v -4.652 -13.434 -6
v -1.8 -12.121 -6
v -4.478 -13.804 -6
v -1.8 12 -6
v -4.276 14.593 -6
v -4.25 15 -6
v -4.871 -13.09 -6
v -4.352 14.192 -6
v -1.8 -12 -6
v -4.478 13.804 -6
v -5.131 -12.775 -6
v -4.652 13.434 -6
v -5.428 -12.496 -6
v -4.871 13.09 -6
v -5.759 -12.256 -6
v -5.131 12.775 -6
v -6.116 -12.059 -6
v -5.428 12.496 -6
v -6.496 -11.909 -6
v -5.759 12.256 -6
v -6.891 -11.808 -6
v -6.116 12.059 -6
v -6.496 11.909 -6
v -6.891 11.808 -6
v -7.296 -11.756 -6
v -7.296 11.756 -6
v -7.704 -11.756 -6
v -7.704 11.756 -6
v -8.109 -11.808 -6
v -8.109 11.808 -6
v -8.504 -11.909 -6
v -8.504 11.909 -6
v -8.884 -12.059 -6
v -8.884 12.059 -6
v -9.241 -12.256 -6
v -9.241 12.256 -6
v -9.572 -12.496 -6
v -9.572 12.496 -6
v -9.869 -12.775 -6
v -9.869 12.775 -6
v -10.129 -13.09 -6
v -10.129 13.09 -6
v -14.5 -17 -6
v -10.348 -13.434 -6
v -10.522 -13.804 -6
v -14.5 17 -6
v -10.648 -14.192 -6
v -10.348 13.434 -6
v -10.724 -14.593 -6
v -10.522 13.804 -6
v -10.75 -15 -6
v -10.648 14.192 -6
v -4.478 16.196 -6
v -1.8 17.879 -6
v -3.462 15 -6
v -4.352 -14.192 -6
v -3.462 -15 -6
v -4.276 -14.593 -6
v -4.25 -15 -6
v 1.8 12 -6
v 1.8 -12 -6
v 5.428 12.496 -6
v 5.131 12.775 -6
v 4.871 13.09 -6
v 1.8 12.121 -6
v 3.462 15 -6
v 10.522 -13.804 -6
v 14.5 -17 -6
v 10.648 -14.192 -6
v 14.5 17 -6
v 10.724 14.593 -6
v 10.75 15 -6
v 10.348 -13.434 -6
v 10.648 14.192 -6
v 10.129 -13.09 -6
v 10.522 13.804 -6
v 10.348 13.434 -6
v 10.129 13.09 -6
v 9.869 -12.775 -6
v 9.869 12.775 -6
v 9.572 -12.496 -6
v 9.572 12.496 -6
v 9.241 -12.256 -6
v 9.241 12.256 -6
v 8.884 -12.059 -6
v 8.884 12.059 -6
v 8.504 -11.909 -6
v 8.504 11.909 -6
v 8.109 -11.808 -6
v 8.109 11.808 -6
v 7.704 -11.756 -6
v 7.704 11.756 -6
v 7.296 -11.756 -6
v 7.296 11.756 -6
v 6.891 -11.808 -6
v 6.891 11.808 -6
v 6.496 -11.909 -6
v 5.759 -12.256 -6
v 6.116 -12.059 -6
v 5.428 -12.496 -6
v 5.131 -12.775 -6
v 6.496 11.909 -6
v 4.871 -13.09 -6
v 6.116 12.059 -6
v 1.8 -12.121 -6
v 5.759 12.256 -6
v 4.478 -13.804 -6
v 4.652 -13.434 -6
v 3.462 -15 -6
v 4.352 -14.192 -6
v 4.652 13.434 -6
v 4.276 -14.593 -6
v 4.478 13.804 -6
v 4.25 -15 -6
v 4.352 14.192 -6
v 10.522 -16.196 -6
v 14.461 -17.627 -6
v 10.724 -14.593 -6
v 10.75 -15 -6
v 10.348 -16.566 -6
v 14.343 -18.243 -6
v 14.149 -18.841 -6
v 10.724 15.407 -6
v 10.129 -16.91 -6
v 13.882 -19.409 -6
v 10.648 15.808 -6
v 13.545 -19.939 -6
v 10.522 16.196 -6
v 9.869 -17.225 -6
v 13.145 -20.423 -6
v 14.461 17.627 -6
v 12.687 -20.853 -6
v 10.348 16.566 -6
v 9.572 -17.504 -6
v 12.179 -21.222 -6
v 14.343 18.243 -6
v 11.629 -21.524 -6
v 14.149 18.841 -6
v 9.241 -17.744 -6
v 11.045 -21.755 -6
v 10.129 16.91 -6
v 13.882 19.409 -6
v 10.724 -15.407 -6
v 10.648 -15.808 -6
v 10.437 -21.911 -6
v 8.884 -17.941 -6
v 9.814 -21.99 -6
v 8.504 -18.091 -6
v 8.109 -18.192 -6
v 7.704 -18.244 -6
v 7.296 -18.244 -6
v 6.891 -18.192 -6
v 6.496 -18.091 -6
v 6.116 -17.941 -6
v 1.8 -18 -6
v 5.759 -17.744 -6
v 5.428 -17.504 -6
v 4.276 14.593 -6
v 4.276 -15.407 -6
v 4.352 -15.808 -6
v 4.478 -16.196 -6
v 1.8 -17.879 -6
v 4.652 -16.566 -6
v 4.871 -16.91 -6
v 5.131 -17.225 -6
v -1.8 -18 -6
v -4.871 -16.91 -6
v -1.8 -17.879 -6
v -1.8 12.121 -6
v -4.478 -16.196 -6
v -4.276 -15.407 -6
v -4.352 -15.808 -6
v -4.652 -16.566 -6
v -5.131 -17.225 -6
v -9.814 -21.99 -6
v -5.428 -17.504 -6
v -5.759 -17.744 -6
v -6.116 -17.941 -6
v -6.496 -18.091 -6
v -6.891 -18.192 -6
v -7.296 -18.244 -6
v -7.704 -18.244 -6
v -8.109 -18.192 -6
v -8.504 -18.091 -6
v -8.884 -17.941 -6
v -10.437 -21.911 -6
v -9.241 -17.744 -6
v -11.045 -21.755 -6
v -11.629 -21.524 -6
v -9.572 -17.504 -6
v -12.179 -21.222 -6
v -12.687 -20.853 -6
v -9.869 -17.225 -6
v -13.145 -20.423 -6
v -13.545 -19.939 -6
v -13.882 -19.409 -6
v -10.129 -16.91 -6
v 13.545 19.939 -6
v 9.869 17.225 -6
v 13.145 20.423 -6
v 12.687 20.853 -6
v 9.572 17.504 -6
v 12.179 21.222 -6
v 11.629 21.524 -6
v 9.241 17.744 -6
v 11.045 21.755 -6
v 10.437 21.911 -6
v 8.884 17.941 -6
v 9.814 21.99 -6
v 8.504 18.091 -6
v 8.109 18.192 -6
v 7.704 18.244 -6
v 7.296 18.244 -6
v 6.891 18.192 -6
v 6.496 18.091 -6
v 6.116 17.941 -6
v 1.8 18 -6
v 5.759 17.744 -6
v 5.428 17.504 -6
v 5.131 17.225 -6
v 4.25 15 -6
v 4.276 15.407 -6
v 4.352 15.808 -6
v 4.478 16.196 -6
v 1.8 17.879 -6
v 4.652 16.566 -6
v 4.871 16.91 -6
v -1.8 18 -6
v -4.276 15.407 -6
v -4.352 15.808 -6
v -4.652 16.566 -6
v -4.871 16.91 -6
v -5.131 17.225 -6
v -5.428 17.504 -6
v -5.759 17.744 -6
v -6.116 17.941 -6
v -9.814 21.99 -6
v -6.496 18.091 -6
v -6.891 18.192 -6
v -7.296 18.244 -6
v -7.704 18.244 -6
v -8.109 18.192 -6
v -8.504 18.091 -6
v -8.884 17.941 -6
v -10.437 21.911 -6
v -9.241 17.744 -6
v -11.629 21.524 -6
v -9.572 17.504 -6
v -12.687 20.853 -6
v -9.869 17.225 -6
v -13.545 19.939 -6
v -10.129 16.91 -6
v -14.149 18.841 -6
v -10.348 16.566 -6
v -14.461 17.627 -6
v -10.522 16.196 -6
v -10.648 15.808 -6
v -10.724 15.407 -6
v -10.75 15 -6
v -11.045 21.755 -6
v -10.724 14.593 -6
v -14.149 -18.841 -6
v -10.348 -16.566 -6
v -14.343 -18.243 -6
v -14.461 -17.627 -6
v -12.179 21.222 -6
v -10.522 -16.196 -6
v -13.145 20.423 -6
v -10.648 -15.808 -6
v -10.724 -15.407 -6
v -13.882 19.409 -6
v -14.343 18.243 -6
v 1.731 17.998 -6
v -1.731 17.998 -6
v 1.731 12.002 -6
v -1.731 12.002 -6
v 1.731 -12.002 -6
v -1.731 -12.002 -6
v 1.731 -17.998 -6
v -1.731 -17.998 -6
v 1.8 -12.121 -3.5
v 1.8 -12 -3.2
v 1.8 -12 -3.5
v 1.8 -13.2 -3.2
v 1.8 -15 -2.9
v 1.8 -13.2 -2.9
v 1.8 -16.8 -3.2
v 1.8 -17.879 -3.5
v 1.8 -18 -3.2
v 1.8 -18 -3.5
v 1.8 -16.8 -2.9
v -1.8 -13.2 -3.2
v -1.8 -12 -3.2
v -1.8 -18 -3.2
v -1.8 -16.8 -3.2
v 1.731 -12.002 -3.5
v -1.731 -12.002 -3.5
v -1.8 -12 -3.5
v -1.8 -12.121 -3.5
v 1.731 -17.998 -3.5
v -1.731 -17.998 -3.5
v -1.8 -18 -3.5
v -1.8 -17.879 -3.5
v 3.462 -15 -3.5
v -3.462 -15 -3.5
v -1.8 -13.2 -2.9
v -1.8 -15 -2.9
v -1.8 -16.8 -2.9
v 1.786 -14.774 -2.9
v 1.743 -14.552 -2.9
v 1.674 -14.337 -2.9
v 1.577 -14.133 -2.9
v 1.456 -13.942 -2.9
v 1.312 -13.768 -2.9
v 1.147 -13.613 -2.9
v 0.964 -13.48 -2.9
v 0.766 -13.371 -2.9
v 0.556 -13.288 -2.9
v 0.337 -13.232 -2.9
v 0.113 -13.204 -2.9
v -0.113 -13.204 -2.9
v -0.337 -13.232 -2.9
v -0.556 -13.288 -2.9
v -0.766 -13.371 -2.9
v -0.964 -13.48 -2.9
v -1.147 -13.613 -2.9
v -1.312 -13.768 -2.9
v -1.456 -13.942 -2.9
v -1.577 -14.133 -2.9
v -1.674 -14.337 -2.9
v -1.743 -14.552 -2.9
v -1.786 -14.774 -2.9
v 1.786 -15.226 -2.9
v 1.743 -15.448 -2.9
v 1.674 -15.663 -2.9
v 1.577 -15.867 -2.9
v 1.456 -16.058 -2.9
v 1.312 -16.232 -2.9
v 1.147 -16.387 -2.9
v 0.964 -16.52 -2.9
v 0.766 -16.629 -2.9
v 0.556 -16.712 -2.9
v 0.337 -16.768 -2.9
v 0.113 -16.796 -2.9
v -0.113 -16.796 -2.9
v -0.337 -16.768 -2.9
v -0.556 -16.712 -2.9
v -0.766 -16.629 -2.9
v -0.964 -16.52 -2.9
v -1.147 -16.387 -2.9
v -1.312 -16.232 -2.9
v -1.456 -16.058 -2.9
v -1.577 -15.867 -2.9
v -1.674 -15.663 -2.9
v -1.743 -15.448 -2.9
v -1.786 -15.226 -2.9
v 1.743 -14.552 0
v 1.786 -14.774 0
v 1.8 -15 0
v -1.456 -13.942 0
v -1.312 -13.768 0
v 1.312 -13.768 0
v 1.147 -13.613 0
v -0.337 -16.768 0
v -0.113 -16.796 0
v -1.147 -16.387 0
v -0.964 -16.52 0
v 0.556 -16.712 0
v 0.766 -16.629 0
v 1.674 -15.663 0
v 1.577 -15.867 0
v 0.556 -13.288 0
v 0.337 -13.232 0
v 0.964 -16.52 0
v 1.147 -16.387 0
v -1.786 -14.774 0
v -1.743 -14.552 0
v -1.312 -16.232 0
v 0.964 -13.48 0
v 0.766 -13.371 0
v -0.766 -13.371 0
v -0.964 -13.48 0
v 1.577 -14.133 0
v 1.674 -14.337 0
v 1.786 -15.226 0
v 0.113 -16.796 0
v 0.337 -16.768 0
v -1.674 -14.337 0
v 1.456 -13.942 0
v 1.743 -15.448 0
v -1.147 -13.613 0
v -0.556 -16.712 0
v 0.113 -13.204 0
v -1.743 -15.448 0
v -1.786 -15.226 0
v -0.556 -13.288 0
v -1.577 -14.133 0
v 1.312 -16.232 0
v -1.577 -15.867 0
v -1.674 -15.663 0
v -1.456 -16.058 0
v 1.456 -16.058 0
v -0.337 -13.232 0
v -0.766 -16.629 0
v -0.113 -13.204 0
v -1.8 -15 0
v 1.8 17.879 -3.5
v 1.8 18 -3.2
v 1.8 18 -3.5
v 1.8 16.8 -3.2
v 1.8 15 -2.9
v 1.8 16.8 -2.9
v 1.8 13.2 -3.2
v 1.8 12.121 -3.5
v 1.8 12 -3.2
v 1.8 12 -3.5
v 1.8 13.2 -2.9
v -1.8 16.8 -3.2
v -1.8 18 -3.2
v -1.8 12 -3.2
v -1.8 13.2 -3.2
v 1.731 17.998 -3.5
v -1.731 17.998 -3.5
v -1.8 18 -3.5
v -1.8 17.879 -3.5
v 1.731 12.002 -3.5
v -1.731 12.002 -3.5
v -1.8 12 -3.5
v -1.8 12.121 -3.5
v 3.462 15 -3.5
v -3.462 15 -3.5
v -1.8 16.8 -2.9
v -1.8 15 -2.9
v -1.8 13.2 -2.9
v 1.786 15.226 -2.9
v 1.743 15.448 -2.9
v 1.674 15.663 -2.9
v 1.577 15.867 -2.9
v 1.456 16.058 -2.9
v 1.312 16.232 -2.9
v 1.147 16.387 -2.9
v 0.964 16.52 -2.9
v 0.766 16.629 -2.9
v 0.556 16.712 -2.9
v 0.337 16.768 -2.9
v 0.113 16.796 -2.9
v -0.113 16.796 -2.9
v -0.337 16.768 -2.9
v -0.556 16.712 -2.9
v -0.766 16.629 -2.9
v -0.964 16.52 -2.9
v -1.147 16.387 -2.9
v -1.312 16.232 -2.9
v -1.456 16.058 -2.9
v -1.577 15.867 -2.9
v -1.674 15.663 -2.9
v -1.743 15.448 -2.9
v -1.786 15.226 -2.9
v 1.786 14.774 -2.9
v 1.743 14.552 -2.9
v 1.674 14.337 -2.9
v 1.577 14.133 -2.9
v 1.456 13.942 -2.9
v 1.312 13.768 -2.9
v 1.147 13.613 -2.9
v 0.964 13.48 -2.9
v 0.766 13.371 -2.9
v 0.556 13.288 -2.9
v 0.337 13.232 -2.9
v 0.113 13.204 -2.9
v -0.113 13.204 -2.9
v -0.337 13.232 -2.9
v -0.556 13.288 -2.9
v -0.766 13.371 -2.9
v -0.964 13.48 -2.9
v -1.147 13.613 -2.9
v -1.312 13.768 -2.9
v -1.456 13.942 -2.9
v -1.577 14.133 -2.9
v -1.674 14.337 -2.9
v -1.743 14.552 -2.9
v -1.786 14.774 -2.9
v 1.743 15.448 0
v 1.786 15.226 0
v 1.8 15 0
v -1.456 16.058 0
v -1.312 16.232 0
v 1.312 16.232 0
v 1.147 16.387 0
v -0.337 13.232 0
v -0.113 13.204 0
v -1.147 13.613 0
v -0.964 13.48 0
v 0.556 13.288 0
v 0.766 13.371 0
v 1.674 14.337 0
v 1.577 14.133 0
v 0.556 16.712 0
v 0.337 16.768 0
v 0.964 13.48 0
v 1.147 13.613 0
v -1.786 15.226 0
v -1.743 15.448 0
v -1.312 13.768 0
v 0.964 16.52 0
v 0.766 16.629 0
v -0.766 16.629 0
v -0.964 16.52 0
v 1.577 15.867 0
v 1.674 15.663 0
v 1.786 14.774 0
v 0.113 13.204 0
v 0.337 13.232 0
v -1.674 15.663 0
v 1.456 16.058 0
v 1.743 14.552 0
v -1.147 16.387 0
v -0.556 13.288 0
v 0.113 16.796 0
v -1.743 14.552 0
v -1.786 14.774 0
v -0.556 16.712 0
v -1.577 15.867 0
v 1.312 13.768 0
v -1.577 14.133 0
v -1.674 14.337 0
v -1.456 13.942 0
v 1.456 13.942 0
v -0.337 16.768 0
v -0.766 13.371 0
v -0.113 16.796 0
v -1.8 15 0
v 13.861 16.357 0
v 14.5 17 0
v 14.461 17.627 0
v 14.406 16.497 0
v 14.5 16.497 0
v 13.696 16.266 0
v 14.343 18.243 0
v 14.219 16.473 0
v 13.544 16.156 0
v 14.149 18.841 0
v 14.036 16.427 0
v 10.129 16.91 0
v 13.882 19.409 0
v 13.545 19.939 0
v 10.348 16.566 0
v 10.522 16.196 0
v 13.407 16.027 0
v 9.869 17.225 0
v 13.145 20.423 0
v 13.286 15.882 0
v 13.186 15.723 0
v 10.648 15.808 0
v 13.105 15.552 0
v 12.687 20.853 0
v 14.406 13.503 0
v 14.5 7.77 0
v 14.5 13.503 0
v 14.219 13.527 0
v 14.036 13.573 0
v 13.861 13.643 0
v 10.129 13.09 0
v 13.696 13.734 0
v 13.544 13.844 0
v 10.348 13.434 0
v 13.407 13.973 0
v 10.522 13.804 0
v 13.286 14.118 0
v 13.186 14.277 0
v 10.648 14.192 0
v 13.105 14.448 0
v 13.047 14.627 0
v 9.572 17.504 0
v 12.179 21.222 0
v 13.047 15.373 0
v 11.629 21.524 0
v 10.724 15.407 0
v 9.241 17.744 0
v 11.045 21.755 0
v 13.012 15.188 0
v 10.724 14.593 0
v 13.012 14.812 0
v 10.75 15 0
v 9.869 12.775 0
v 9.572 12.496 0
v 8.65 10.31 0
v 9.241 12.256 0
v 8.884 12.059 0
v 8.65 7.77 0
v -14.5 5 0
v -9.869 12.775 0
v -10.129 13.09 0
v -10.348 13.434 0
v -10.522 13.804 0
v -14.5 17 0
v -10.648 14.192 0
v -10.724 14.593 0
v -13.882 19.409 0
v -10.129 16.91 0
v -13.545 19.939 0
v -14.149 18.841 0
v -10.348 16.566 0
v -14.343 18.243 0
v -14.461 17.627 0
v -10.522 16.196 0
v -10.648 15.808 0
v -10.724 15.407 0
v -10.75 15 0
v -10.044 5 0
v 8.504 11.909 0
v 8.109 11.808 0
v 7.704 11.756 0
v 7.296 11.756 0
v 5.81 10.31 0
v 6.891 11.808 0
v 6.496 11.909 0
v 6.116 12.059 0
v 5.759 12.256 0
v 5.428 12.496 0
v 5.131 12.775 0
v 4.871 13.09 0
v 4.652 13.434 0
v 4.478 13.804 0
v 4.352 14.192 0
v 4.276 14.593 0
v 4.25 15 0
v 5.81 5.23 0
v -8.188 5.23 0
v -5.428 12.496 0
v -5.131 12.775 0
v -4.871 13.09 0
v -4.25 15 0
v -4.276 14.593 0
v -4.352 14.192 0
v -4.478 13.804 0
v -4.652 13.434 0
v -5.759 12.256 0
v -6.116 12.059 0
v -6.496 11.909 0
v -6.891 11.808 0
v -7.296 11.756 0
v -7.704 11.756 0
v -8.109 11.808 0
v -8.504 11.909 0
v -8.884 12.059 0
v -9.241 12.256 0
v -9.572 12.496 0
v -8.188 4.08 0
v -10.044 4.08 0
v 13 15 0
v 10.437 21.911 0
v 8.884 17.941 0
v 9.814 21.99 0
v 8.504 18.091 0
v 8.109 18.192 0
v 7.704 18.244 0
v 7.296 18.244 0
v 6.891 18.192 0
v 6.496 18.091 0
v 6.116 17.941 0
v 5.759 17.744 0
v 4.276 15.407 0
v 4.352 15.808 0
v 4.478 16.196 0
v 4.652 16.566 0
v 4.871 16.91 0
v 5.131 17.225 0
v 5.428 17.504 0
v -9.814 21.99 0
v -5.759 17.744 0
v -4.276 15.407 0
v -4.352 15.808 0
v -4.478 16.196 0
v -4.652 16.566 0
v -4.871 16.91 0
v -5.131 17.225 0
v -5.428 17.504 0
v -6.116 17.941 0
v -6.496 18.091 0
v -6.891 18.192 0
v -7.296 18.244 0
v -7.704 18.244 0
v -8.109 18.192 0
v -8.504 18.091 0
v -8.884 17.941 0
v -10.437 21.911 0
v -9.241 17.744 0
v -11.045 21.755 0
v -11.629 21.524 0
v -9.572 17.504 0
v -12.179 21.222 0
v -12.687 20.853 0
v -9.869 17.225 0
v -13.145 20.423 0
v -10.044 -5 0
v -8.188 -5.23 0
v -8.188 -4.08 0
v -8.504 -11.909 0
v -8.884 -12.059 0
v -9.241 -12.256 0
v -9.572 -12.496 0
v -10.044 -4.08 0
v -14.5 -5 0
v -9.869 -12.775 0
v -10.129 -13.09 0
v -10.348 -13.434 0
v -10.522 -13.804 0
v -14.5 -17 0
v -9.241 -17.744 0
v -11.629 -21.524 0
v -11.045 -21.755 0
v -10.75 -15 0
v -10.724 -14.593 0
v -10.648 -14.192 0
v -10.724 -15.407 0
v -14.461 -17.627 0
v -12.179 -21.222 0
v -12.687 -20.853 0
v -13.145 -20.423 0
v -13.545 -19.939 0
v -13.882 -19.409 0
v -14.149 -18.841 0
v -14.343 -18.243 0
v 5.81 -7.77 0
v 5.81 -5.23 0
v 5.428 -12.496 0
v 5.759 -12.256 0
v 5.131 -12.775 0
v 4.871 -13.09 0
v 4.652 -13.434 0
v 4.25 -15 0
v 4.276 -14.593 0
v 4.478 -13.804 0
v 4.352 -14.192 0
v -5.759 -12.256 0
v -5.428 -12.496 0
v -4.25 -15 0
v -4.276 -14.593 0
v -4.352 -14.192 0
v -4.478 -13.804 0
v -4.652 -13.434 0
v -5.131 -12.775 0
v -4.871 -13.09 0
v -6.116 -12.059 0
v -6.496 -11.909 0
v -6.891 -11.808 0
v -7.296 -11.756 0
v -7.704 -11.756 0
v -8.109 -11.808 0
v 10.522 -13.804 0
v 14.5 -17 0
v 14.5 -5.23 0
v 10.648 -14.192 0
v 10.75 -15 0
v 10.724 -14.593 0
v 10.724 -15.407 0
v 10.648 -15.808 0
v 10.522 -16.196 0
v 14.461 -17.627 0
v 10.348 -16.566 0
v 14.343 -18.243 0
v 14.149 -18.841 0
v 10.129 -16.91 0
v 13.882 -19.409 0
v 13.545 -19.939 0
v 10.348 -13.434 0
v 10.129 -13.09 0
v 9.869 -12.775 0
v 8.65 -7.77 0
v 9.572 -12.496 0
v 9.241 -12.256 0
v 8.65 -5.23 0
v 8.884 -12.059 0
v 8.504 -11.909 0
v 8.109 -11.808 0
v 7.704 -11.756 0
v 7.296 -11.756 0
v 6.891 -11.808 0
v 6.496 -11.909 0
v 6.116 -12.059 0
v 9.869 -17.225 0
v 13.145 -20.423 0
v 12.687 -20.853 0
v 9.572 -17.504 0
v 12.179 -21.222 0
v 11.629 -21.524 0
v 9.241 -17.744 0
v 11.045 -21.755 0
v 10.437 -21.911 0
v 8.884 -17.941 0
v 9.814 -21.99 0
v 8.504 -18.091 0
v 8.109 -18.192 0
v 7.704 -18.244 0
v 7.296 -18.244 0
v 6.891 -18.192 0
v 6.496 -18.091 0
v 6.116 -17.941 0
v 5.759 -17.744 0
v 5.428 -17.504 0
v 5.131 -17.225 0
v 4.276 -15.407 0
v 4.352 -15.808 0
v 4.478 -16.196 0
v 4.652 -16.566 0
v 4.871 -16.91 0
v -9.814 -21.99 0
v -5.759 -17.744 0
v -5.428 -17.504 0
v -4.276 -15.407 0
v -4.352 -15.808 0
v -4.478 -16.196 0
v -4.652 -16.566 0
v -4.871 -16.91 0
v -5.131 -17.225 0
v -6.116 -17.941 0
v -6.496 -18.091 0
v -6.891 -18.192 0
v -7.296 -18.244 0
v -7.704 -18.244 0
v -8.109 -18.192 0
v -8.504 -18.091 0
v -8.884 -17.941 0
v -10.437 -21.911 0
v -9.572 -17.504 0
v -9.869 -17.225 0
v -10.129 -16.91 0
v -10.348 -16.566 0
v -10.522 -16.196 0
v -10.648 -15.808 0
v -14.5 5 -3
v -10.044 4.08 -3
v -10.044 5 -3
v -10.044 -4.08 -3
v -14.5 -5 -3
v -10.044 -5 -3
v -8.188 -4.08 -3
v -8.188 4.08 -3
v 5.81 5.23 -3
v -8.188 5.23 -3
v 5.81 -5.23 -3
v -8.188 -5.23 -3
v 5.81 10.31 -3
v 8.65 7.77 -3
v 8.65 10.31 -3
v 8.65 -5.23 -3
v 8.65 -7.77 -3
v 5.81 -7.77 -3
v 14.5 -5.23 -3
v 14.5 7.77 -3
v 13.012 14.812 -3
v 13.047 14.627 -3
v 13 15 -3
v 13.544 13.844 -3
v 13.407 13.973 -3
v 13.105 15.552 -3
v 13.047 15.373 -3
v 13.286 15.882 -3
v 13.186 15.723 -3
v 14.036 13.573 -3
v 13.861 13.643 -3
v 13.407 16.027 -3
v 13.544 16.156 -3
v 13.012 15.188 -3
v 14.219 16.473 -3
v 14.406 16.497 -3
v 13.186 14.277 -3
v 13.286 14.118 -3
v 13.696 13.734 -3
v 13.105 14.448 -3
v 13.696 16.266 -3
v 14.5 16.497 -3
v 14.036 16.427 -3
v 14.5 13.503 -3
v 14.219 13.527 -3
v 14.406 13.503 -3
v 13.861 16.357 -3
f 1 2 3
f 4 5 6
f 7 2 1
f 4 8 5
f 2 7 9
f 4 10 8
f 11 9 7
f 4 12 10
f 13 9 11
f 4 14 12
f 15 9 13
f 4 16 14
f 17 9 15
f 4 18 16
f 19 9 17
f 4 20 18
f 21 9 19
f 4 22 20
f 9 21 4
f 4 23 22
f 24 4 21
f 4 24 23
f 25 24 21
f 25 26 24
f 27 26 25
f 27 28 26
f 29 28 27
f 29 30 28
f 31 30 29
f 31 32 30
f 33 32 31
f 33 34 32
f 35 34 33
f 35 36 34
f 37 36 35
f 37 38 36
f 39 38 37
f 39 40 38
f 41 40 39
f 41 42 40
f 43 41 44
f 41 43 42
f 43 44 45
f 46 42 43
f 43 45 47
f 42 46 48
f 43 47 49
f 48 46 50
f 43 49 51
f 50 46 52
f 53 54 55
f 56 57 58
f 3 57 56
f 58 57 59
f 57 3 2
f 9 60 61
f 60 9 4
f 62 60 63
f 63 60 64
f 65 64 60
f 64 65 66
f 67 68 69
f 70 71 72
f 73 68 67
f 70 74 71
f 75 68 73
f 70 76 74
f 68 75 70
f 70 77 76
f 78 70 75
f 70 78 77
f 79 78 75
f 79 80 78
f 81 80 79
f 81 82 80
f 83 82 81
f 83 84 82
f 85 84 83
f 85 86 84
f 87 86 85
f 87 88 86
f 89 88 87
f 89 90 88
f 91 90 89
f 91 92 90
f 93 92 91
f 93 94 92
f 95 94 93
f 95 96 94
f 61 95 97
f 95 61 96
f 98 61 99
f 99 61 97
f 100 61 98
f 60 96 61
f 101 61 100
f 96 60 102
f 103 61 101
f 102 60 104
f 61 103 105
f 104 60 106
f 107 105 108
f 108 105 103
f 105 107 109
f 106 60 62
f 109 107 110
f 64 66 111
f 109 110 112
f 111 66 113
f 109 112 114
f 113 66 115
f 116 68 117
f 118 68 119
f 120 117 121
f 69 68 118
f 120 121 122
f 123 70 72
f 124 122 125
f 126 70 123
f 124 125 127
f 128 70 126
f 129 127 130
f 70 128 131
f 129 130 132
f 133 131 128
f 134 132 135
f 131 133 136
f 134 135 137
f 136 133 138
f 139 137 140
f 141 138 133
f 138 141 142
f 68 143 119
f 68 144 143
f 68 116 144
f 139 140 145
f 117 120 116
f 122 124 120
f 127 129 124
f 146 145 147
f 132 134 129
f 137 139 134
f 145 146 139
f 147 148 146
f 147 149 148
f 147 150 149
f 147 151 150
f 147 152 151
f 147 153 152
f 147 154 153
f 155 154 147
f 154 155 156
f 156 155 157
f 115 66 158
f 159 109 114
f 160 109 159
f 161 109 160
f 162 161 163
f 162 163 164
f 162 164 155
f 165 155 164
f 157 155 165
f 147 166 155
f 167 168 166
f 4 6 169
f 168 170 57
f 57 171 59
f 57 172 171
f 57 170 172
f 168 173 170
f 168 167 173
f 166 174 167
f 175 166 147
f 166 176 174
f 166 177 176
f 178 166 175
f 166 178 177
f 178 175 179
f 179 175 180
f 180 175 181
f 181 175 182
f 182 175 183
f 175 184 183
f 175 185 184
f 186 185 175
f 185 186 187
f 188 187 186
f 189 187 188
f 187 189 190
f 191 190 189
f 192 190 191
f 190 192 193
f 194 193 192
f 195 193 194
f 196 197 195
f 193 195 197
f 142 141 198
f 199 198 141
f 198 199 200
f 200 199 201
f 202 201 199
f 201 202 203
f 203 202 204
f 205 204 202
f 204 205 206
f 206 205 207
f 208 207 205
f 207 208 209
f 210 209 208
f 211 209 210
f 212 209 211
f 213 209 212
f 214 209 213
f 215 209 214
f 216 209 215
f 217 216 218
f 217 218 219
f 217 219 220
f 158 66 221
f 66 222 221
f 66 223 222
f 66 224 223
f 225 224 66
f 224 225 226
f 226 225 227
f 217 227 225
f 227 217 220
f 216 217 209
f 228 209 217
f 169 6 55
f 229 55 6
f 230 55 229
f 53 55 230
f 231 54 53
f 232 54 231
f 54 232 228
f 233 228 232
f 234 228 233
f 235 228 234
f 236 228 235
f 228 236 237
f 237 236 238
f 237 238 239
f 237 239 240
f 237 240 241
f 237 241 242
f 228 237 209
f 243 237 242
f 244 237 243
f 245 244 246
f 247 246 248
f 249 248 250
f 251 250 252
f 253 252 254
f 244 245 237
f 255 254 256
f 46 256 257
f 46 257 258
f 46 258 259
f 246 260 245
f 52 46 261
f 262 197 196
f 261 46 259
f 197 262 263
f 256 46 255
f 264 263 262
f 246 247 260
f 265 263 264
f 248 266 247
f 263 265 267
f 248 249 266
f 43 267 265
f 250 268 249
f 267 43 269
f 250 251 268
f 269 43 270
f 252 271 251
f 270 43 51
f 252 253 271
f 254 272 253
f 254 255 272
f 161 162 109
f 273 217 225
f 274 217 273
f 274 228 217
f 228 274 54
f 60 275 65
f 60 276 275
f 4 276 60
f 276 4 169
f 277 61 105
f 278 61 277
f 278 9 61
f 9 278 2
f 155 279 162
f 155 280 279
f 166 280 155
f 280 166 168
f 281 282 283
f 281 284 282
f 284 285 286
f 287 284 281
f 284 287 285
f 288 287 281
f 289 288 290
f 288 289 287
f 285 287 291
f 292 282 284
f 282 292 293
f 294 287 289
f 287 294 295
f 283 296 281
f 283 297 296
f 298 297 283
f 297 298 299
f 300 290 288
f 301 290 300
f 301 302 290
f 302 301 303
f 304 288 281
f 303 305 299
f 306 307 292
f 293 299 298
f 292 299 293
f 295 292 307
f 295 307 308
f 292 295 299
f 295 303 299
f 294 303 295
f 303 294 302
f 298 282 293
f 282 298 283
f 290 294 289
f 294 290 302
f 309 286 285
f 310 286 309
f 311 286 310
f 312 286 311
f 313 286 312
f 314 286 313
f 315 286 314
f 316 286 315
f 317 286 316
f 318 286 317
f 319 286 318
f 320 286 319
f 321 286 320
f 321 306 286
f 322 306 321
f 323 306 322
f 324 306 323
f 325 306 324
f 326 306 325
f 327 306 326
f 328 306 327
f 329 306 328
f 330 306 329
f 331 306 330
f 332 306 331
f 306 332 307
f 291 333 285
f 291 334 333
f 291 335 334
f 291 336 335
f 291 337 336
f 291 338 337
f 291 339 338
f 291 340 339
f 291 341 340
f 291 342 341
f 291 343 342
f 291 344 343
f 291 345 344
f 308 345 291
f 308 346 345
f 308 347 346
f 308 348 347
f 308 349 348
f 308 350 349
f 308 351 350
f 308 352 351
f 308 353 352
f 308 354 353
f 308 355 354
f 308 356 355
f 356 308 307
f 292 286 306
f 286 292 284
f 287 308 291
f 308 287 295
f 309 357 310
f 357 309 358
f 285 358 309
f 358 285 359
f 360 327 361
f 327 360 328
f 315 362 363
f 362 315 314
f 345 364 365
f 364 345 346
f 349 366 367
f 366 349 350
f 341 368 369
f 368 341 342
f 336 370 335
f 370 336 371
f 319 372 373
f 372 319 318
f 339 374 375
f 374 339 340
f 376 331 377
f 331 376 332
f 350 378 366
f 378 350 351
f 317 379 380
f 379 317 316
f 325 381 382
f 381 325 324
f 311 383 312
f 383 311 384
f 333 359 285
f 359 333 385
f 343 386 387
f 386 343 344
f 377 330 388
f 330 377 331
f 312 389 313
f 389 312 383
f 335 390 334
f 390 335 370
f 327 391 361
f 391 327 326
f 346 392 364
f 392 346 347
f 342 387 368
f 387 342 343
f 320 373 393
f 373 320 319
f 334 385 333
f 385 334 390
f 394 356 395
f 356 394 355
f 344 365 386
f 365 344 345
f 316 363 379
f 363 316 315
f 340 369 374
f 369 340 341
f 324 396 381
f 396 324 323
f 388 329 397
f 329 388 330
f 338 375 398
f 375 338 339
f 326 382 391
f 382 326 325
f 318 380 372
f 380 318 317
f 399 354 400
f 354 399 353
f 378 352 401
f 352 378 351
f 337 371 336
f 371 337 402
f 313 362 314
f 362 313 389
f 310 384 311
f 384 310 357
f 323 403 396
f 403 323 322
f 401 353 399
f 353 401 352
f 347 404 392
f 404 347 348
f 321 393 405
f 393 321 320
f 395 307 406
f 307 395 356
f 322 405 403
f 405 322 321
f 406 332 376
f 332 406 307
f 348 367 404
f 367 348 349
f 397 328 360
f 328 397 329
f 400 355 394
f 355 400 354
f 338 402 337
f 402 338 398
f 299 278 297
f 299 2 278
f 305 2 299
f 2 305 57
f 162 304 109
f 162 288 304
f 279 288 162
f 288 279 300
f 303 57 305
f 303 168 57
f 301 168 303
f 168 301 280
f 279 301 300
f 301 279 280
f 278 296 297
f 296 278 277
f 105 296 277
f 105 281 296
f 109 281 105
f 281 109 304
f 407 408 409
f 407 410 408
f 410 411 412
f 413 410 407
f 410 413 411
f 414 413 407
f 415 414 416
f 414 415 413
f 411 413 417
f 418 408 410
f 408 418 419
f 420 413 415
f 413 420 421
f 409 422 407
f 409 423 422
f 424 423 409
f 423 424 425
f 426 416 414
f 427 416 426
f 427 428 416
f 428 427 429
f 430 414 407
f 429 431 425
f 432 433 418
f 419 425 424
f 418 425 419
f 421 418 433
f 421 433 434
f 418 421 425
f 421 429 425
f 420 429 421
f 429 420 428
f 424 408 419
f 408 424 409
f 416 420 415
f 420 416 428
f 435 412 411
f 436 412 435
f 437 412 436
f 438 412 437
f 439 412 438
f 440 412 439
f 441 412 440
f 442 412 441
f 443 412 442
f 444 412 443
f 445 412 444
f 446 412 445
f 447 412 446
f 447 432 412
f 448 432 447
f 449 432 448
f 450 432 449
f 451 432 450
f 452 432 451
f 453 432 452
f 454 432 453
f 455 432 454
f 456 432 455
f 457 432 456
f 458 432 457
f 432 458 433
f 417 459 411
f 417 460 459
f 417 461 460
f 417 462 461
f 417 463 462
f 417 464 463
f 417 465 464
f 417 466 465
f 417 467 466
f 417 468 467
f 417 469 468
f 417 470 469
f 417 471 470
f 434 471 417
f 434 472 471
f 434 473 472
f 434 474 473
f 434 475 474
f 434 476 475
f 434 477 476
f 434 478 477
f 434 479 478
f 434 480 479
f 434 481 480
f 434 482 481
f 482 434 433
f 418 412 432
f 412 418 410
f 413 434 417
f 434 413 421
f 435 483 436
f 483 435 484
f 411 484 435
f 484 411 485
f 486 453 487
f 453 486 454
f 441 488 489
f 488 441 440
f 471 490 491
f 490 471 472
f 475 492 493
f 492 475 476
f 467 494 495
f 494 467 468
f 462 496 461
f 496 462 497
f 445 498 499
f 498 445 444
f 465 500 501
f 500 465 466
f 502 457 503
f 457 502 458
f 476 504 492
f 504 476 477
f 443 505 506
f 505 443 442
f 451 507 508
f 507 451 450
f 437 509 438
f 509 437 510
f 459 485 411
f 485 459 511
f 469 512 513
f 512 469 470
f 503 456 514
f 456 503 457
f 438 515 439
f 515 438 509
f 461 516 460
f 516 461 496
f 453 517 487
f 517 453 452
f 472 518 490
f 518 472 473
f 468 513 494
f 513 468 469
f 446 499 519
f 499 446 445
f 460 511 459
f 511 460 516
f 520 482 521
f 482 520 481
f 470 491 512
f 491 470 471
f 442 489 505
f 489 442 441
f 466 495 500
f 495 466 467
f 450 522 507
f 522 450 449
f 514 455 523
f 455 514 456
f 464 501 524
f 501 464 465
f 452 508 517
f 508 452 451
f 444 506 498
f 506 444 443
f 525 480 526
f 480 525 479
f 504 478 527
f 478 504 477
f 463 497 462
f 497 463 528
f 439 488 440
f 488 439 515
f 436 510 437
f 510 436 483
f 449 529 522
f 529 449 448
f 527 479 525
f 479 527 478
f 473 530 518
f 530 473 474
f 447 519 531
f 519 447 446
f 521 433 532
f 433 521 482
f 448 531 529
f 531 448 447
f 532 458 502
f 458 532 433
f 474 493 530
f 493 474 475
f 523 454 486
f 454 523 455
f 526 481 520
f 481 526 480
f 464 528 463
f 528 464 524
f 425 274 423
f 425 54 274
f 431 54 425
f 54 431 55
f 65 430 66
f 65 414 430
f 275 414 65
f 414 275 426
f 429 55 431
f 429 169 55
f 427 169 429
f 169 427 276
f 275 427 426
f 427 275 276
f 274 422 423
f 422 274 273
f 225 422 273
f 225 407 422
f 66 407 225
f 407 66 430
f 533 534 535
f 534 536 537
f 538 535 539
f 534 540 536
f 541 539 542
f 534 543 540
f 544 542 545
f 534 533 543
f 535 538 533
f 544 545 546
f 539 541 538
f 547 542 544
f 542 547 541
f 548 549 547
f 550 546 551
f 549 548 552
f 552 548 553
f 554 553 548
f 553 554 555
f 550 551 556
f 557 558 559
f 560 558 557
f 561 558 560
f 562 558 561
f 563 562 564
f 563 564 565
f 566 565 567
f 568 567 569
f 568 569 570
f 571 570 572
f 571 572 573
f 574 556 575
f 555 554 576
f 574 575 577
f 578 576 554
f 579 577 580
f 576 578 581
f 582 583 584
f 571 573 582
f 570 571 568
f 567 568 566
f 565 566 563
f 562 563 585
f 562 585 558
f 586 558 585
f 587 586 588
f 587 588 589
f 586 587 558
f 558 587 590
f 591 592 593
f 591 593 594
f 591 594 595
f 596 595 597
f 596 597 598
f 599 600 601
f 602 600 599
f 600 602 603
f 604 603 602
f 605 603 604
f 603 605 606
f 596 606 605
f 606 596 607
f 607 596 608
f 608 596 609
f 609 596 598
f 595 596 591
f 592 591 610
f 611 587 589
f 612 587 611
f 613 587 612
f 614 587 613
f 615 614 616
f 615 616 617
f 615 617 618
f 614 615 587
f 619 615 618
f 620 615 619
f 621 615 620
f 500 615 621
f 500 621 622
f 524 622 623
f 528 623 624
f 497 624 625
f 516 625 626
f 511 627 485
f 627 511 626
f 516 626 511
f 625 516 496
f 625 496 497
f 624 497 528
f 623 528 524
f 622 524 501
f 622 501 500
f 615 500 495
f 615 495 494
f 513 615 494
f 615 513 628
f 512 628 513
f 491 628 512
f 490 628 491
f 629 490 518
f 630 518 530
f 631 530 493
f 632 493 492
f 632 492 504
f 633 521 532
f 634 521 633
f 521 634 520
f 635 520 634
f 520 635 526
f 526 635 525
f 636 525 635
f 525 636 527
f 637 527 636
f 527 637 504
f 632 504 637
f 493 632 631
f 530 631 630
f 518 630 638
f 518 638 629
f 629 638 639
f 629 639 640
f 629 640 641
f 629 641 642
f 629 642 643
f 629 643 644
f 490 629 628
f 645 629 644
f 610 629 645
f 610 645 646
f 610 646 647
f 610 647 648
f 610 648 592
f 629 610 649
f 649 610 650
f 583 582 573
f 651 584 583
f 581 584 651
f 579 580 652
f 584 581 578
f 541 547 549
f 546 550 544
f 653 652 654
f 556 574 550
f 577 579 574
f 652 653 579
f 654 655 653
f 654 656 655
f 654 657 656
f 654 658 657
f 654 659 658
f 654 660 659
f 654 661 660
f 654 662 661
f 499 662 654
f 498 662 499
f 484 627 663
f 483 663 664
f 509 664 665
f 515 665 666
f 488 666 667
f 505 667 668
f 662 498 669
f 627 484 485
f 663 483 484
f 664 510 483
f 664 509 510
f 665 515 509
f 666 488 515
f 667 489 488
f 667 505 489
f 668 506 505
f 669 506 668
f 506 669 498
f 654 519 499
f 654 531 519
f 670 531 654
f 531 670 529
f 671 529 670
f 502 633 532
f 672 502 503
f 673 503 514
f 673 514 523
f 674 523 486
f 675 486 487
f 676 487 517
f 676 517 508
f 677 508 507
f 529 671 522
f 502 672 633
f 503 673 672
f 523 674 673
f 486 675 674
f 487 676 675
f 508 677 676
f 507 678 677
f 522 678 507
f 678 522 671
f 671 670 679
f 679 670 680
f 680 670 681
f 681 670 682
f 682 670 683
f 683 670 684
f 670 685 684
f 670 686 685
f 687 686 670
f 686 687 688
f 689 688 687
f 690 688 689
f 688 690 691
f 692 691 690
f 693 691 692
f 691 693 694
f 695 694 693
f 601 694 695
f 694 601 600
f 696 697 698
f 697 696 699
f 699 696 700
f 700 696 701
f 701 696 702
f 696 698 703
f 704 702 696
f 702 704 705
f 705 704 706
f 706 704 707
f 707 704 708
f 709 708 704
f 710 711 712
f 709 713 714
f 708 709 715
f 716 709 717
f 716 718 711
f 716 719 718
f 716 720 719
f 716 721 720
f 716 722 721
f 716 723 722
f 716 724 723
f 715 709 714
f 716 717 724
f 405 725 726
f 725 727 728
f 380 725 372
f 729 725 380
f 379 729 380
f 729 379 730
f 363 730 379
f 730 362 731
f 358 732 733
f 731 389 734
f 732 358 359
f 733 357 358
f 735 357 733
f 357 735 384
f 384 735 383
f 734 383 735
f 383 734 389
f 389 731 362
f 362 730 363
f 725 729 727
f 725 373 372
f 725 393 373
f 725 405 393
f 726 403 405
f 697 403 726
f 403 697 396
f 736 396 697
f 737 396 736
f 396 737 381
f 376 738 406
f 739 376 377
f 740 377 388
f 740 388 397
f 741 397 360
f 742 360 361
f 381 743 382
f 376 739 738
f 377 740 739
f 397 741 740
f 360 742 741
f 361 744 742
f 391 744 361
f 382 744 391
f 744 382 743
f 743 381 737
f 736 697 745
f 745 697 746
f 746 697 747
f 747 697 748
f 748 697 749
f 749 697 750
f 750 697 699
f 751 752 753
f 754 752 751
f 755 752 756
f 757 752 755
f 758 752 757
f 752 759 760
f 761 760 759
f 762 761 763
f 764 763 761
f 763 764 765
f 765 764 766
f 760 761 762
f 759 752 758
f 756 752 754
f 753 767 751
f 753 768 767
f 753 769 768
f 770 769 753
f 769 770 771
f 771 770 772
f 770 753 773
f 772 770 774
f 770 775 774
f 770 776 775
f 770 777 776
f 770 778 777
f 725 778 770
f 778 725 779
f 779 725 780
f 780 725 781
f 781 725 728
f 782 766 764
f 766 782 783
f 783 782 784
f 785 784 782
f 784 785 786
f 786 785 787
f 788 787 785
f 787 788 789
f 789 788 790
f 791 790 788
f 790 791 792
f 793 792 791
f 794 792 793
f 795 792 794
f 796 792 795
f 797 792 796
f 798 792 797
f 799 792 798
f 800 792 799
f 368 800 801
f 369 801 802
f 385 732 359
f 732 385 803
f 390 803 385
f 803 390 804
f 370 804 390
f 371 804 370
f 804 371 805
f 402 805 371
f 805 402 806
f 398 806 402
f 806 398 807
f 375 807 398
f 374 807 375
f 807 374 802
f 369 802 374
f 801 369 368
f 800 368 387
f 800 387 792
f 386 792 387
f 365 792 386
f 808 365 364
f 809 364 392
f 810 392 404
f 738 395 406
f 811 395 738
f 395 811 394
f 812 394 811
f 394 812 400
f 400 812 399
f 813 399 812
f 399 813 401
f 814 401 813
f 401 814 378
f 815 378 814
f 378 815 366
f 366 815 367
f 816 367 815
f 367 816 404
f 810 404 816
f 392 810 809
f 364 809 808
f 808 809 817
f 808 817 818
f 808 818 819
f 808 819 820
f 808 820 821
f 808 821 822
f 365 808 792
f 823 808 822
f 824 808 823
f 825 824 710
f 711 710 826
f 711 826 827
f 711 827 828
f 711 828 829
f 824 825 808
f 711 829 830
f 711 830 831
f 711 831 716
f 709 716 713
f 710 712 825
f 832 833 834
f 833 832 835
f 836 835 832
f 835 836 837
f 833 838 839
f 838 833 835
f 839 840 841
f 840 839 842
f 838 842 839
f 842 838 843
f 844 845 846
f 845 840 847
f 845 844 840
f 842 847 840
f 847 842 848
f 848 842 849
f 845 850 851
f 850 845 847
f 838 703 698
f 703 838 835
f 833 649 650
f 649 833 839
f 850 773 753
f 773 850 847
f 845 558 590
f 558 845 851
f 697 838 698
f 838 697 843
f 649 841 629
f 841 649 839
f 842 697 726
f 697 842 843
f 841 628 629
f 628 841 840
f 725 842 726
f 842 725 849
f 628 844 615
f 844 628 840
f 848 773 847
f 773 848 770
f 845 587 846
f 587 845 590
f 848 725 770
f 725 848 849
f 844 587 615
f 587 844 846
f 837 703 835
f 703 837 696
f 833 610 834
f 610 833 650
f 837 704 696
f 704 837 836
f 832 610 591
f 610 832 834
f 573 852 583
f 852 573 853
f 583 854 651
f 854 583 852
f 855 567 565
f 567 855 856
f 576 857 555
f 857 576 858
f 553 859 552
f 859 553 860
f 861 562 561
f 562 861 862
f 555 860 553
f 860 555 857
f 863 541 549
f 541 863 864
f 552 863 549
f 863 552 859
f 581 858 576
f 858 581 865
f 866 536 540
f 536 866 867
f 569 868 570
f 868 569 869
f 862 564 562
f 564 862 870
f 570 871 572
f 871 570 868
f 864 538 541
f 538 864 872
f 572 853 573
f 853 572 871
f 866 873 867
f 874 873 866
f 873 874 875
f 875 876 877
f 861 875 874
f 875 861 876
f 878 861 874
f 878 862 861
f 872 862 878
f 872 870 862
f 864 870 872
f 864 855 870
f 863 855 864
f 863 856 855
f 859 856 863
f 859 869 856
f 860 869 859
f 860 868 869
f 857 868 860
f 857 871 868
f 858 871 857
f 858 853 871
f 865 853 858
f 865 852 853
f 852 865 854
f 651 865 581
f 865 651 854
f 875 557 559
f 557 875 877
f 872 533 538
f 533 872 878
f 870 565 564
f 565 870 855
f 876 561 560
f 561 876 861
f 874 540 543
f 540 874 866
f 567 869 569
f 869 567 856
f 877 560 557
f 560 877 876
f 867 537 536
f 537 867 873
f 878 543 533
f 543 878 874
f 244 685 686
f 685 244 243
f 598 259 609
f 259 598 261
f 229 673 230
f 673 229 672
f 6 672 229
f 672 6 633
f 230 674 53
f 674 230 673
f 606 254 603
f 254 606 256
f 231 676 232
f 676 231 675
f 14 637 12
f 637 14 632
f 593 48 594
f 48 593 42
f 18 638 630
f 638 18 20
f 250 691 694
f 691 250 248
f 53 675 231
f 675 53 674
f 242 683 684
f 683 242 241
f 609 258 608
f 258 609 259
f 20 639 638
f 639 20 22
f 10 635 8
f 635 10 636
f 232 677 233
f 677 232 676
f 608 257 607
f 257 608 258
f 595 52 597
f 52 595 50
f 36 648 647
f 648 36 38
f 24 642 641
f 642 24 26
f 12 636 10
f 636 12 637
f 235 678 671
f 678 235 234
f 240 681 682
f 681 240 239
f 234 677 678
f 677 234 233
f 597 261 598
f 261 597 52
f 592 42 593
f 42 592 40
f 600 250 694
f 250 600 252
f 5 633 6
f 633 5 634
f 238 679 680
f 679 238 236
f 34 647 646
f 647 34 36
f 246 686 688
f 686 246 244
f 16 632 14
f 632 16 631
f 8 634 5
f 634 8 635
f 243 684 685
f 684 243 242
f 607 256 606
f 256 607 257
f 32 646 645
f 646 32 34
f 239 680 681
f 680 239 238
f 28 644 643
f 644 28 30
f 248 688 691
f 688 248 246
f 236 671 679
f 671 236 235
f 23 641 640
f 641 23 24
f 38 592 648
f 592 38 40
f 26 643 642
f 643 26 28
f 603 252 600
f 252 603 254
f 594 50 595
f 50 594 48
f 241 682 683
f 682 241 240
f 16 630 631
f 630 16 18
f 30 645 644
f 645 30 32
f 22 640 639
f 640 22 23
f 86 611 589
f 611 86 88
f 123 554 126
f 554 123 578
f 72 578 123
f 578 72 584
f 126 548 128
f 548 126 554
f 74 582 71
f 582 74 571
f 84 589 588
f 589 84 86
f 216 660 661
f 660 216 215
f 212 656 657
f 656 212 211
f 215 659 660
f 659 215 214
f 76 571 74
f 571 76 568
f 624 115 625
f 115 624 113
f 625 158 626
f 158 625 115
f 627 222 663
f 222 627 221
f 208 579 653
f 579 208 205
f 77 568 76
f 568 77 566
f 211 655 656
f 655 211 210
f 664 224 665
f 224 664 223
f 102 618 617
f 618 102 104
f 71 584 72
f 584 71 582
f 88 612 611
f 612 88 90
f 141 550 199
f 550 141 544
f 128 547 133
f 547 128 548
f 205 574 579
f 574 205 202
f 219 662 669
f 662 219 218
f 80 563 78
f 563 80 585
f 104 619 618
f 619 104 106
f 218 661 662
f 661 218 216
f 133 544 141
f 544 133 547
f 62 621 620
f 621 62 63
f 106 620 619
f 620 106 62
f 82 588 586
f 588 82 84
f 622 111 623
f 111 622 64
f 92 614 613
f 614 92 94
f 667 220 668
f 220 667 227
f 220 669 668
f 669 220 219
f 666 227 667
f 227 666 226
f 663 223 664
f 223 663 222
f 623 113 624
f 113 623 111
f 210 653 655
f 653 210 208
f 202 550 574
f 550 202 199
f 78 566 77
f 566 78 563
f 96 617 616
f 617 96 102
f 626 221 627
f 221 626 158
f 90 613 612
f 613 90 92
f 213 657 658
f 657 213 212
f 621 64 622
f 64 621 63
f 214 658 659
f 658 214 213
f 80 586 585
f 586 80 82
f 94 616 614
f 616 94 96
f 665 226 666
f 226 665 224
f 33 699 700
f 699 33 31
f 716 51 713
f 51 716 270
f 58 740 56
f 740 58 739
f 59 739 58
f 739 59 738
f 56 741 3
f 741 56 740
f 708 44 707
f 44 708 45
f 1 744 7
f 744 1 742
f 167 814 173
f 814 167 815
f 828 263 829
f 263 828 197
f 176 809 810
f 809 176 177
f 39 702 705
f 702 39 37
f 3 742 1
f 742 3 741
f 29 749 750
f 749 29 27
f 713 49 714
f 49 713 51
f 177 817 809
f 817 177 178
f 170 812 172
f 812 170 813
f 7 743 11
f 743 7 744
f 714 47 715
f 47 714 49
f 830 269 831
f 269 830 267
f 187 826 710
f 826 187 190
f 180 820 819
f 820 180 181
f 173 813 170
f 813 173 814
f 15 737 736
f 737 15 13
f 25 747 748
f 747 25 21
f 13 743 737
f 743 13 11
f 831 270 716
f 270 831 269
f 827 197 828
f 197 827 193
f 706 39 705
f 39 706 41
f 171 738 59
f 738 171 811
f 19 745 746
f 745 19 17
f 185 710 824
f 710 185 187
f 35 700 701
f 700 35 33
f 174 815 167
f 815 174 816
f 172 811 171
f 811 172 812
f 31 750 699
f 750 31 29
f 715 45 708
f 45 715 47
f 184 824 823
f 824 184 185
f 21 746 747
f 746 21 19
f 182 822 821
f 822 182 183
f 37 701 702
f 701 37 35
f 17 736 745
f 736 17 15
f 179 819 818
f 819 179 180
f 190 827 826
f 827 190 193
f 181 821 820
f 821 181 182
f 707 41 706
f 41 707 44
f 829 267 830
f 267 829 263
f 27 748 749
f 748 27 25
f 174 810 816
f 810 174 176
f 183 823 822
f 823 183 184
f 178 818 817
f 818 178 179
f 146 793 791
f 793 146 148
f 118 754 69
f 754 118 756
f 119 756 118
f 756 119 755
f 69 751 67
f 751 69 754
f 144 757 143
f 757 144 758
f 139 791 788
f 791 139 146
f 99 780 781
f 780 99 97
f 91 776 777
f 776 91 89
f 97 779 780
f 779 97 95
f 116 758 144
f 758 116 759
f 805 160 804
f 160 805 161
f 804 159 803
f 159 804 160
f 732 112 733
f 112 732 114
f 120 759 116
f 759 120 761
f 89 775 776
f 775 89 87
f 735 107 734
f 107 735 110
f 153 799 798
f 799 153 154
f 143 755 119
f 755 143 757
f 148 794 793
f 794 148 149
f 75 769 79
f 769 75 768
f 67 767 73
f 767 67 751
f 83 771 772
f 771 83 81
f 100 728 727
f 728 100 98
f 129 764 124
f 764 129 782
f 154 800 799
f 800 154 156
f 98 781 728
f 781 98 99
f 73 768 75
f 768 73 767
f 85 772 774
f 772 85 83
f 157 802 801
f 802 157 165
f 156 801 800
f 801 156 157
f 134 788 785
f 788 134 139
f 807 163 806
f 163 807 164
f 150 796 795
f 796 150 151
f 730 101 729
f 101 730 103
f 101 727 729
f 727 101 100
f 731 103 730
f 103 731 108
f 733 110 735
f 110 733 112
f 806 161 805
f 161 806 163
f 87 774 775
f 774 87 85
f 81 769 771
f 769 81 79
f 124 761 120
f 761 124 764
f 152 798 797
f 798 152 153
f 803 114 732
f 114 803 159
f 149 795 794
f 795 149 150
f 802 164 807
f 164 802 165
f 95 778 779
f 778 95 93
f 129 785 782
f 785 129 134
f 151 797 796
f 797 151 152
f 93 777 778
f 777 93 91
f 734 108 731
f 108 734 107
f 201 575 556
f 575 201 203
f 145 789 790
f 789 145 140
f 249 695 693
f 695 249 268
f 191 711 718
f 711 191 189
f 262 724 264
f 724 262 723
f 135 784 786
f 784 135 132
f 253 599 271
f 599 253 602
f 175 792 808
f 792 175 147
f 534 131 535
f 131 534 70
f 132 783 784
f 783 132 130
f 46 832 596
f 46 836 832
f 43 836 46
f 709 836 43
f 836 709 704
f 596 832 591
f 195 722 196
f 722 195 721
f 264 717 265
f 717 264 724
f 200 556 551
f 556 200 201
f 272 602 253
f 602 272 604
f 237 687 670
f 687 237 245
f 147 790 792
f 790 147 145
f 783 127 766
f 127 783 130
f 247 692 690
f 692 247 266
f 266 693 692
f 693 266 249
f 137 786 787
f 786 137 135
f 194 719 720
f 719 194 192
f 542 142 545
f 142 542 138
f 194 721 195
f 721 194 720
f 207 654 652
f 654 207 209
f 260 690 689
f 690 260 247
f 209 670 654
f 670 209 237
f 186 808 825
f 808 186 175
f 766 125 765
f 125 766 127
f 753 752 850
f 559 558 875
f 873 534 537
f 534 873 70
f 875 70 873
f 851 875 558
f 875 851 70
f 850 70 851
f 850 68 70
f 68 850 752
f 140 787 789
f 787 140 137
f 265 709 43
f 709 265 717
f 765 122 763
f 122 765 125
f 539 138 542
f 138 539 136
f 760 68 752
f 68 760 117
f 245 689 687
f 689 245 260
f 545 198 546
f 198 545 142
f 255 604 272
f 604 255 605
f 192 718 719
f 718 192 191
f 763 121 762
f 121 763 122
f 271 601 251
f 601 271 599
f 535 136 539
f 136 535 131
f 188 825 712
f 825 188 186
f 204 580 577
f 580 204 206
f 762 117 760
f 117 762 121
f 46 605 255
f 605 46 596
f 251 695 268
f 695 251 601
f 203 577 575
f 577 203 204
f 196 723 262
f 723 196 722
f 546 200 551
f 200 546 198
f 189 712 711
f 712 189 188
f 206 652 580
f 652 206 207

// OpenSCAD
$fn = 50;


difference() {
	union() {
		*color(alpha = 1.0000000000, c = "gray") {
			translate(v = [0, 14, -6]) {
				linear_extrude(height = 3) {
					text(font = "Arial:style=Bold", halign = "center", size = 4.5000000000, text = "COMMENT description oobb_plate_shape_positive_type_6_depth_0_0_-6_pos_i2c_extra_6_thickness_2_width_3_height_0_0_-6_pos_plate", valign = "center");
				}
			}
		}
		translate(v = [0, 0, -6]) {
			hull() {
				translate(v = [-9.5000000000, 17.0000000000, 0]) {
					cylinder(h = 6, r = 5);
				}
				translate(v = [9.5000000000, 17.0000000000, 0]) {
					cylinder(h = 6, r = 5);
				}
				translate(v = [-9.5000000000, -17.0000000000, 0]) {
					cylinder(h = 6, r = 5);
				}
				translate(v = [9.5000000000, -17.0000000000, 0]) {
					cylinder(h = 6, r = 5);
				}
			}
		}
		*color(alpha = 1.0000000000, c = "gray") {
			translate(v = [0, 14, -6]) {
				linear_extrude(height = 3) {
					text(font = "Arial:style=Bold", halign = "center", size = 4.5000000000, text = "COMMENT description oobb_holes_shape_p_type_0_0_-6_pos_i2c_extra_6_thickness_2_width_3_height_0_0_-6_pos_plate_'left'_'right'_hole_sides_'left'_'right'_holes_true_both_holes", valign = "center");
				}
			}
		}
		*color(alpha = 1.0000000000, c = "gray") {
			translate(v = [-7.5000000000, 14, -3]) {
				rotate(a = [0, 0, 180]) {
					linear_extrude(height = 3) {
						text(font = "Arial:style=Bold", halign = "center", size = 4.5000000000, text = "COMMENT description oobb_wire_i2c_shape_-7.5_0_-3_pos_i2c_extra_6_thickness_2_width_3_height_0_0_-6_pos_plate_0_0_180_rot", valign = "center");
					}
				}
			}
		}
	}
	union() {
		translate(v = [0, -15, -6]) {
			rotate(a = [0, 0, 0]) {
				difference() {
					union() {
						translate(v = [-1.8000000000, -3.0000000000, -0.3000000000]) {
							cube(size = [3.6000000000, 6.0000000000, 0.3000000000]);
						}
						translate(v = [-1.8000000000, -1.8000000000, -0.6000000000]) {
							cube(size = [3.6000000000, 3.6000000000, 0.3000000000]);
						}
						translate(v = [-1.8000000000, -3.0000000000, 2.5000000000]) {
							cube(size = [3.6000000000, 6.0000000000, 0.3000000000]);
						}
						translate(v = [-1.8000000000, -1.8000000000, 2.8000000000]) {
							cube(size = [3.6000000000, 3.6000000000, 0.3000000000]);
						}
						translate(v = [0, 0, -50.0000000000]) {
							cylinder(h = 100, r = 1.8000000000);
						}
						linear_extrude(height = 2.5000000000) {
							polygon(points = [[3.4620000000, 0.0000000000], [1.7310000000, 2.9981799479], [-1.7310000000, 2.9981799479], [-3.4620000000, 0.0000000000], [-1.7310000000, -2.9981799479], [1.7310000000, -2.9981799479]]);
						}
						translate(v = [-1.8000000000, -3.0000000000, -0.3000000000]) {
							cube(size = [3.6000000000, 6.0000000000, 0.3000000000]);
						}
						translate(v = [-1.8000000000, -1.8000000000, -0.6000000000]) {
							cube(size = [3.6000000000, 3.6000000000, 0.3000000000]);
						}
						translate(v = [-1.8000000000, -3.0000000000, 2.5000000000]) {
							cube(size = [3.6000000000, 6.0000000000, 0.3000000000]);
						}
						translate(v = [-1.8000000000, -1.8000000000, 2.8000000000]) {
							cube(size = [3.6000000000, 3.6000000000, 0.3000000000]);
						}
						translate(v = [0, 0, -50.0000000000]) {
							cylinder(h = 100, r = 1.8000000000);
						}
						translate(v = [-1.8000000000, -3.0000000000, -0.3000000000]) {
							cube(size = [3.6000000000, 6.0000000000, 0.3000000000]);
						}
						translate(v = [-1.8000000000, -1.8000000000, -0.6000000000]) {
							cube(size = [3.6000000000, 3.6000000000, 0.3000000000]);
						}
						translate(v = [-1.8000000000, -3.0000000000, 2.5000000000]) {
							cube(size = [3.6000000000, 6.0000000000, 0.3000000000]);
						}
						translate(v = [-1.8000000000, -1.8000000000, 2.8000000000]) {
							cube(size = [3.6000000000, 3.6000000000, 0.3000000000]);
						}
						translate(v = [0, 0, -50.0000000000]) {
							cylinder(h = 100, r = 1.8000000000);
						}
					}
					union();
				}
			}
		}
		translate(v = [0, 15, -6]) {
			rotate(a = [0, 0, 0]) {
				difference() {
					union() {
						translate(v = [-1.8000000000, -3.0000000000, -0.3000000000]) {
							cube(size = [3.6000000000, 6.0000000000, 0.3000000000]);
						}
						translate(v = [-1.8000000000, -1.8000000000, -0.6000000000]) {
							cube(size = [3.6000000000, 3.6000000000, 0.3000000000]);
						}
						translate(v = [-1.8000000000, -3.0000000000, 2.5000000000]) {
							cube(size = [3.6000000000, 6.0000000000, 0.3000000000]);
						}
						translate(v = [-1.8000000000, -1.8000000000, 2.8000000000]) {
							cube(size = [3.6000000000, 3.6000000000, 0.3000000000]);
						}
						translate(v = [0, 0, -50.0000000000]) {
							cylinder(h = 100, r = 1.8000000000);
						}
						linear_extrude(height = 2.5000000000) {
							polygon(points = [[3.4620000000, 0.0000000000], [1.7310000000, 2.9981799479], [-1.7310000000, 2.9981799479], [-3.4620000000, 0.0000000000], [-1.7310000000, -2.9981799479], [1.7310000000, -2.9981799479]]);
						}
						translate(v = [-1.8000000000, -3.0000000000, -0.3000000000]) {
							cube(size = [3.6000000000, 6.0000000000, 0.3000000000]);
						}
						translate(v = [-1.8000000000, -1.8000000000, -0.6000000000]) {
							cube(size = [3.6000000000, 3.6000000000, 0.3000000000]);
						}
						translate(v = [-1.8000000000, -3.0000000000, 2.5000000000]) {
							cube(size = [3.6000000000, 6.0000000000, 0.3000000000]);
						}
						translate(v = [-1.8000000000, -1.8000000000, 2.8000000000]) {
							cube(size = [3.6000000000, 3.6000000000, 0.3000000000]);
						}
						translate(v = [0, 0, -50.0000000000]) {
							cylinder(h = 100, r = 1.8000000000);
						}
						translate(v = [-1.8000000000, -3.0000000000, -0.3000000000]) {
							cube(size = [3.6000000000, 6.0000000000, 0.3000000000]);
						}
						translate(v = [-1.8000000000, -1.8000000000, -0.6000000000]) {
							cube(size = [3.6000000000, 3.6000000000, 0.3000000000]);
						}
						translate(v = [-1.8000000000, -3.0000000000, 2.5000000000]) {
							cube(size = [3.6000000000, 6.0000000000, 0.3000000000]);
						}
						translate(v = [-1.8000000000, -1.8000000000, 2.8000000000]) {
							cube(size = [3.6000000000, 3.6000000000, 0.3000000000]);
						}
						translate(v = [0, 0, -50.0000000000]) {
							cylinder(h = 100, r = 1.8000000000);
						}
					}
					union();
				}
			}
		}
		translate(v = [15.0000000000, 0, -3]) {
			rotate(a = [0, 0, 180]) {
				difference() {
					union() {
						#translate(v = [23.0670000000, -4.0800000000, 0]) {
							cube(size = [5, 8.1600000000, 3]);
						}
						#translate(v = [0.2040000000, -7.7700000000, 0]) {
							cube(size = [6.3000000000, 13.0000000000, 3]);
						}
						#translate(v = [8.8880000000, -5.2300000000, 0]) {
							cube(size = [14.3000000000, 10.4600000000, 3]);
						}
						#translate(v = [6.3500000000, -10.3100000000, 0]) {
							cube(size = [2.8400000000, 18.0800000000, 3]);
						}
						#translate(v = [25.0440000000, -5.0000000000, 0]) {
							cube(size = [7, 10, 3]);
						}
						#translate(v = [0.5000000000, -15, 0.0000000000]) {
							cylinder(h = 3, r = 1.5000000000);
						}
					}
					union();
				}
			}
		}
		translate(v = [-7.5000000000, 15.0000000000, -50.0000000000]) {
			cylinder(h = 100, r = 3.2500000000);
		}
		translate(v = [7.5000000000, 15.0000000000, -50.0000000000]) {
			cylinder(h = 100, r = 3.2500000000);
		}
		translate(v = [-7.5000000000, -15.0000000000, -50.0000000000]) {
			cylinder(h = 100, r = 3.2500000000);
		}
		translate(v = [7.5000000000, -15.0000000000, -50.0000000000]) {
			cylinder(h = 100, r = 3.2500000000);
		}
		*color(alpha = 1.0000000000, c = "gray") {
			translate(v = [0, -1, -6]) {
				linear_extrude(height = 3) {
					text(font = "Arial:style=Bold", halign = "center", size = 4.5000000000, text = "COMMENT description oobb_nut_shape_negative_type_m3_radius_name_0_-15_-6_pos_6_thickness_2_width_3_height_0_0_-6_pos_plate_bottom_zz_true_overhang_0_0_0_rot_false_nut_true_hole", valign = "center");
				}
			}
		}
		*color(alpha = 1.0000000000, c = "gray") {
			translate(v = [0, 29, -6]) {
				linear_extrude(height = 3) {
					text(font = "Arial:style=Bold", halign = "center", size = 4.5000000000, text = "COMMENT description oobb_nut_shape_negative_type_m3_radius_name_0_15_-6_pos_6_thickness_2_width_3_height_0_0_-6_pos_plate_bottom_zz_true_overhang_0_0_0_rot_false_nut_true_hole", valign = "center");
				}
			}
		}
	}
}
